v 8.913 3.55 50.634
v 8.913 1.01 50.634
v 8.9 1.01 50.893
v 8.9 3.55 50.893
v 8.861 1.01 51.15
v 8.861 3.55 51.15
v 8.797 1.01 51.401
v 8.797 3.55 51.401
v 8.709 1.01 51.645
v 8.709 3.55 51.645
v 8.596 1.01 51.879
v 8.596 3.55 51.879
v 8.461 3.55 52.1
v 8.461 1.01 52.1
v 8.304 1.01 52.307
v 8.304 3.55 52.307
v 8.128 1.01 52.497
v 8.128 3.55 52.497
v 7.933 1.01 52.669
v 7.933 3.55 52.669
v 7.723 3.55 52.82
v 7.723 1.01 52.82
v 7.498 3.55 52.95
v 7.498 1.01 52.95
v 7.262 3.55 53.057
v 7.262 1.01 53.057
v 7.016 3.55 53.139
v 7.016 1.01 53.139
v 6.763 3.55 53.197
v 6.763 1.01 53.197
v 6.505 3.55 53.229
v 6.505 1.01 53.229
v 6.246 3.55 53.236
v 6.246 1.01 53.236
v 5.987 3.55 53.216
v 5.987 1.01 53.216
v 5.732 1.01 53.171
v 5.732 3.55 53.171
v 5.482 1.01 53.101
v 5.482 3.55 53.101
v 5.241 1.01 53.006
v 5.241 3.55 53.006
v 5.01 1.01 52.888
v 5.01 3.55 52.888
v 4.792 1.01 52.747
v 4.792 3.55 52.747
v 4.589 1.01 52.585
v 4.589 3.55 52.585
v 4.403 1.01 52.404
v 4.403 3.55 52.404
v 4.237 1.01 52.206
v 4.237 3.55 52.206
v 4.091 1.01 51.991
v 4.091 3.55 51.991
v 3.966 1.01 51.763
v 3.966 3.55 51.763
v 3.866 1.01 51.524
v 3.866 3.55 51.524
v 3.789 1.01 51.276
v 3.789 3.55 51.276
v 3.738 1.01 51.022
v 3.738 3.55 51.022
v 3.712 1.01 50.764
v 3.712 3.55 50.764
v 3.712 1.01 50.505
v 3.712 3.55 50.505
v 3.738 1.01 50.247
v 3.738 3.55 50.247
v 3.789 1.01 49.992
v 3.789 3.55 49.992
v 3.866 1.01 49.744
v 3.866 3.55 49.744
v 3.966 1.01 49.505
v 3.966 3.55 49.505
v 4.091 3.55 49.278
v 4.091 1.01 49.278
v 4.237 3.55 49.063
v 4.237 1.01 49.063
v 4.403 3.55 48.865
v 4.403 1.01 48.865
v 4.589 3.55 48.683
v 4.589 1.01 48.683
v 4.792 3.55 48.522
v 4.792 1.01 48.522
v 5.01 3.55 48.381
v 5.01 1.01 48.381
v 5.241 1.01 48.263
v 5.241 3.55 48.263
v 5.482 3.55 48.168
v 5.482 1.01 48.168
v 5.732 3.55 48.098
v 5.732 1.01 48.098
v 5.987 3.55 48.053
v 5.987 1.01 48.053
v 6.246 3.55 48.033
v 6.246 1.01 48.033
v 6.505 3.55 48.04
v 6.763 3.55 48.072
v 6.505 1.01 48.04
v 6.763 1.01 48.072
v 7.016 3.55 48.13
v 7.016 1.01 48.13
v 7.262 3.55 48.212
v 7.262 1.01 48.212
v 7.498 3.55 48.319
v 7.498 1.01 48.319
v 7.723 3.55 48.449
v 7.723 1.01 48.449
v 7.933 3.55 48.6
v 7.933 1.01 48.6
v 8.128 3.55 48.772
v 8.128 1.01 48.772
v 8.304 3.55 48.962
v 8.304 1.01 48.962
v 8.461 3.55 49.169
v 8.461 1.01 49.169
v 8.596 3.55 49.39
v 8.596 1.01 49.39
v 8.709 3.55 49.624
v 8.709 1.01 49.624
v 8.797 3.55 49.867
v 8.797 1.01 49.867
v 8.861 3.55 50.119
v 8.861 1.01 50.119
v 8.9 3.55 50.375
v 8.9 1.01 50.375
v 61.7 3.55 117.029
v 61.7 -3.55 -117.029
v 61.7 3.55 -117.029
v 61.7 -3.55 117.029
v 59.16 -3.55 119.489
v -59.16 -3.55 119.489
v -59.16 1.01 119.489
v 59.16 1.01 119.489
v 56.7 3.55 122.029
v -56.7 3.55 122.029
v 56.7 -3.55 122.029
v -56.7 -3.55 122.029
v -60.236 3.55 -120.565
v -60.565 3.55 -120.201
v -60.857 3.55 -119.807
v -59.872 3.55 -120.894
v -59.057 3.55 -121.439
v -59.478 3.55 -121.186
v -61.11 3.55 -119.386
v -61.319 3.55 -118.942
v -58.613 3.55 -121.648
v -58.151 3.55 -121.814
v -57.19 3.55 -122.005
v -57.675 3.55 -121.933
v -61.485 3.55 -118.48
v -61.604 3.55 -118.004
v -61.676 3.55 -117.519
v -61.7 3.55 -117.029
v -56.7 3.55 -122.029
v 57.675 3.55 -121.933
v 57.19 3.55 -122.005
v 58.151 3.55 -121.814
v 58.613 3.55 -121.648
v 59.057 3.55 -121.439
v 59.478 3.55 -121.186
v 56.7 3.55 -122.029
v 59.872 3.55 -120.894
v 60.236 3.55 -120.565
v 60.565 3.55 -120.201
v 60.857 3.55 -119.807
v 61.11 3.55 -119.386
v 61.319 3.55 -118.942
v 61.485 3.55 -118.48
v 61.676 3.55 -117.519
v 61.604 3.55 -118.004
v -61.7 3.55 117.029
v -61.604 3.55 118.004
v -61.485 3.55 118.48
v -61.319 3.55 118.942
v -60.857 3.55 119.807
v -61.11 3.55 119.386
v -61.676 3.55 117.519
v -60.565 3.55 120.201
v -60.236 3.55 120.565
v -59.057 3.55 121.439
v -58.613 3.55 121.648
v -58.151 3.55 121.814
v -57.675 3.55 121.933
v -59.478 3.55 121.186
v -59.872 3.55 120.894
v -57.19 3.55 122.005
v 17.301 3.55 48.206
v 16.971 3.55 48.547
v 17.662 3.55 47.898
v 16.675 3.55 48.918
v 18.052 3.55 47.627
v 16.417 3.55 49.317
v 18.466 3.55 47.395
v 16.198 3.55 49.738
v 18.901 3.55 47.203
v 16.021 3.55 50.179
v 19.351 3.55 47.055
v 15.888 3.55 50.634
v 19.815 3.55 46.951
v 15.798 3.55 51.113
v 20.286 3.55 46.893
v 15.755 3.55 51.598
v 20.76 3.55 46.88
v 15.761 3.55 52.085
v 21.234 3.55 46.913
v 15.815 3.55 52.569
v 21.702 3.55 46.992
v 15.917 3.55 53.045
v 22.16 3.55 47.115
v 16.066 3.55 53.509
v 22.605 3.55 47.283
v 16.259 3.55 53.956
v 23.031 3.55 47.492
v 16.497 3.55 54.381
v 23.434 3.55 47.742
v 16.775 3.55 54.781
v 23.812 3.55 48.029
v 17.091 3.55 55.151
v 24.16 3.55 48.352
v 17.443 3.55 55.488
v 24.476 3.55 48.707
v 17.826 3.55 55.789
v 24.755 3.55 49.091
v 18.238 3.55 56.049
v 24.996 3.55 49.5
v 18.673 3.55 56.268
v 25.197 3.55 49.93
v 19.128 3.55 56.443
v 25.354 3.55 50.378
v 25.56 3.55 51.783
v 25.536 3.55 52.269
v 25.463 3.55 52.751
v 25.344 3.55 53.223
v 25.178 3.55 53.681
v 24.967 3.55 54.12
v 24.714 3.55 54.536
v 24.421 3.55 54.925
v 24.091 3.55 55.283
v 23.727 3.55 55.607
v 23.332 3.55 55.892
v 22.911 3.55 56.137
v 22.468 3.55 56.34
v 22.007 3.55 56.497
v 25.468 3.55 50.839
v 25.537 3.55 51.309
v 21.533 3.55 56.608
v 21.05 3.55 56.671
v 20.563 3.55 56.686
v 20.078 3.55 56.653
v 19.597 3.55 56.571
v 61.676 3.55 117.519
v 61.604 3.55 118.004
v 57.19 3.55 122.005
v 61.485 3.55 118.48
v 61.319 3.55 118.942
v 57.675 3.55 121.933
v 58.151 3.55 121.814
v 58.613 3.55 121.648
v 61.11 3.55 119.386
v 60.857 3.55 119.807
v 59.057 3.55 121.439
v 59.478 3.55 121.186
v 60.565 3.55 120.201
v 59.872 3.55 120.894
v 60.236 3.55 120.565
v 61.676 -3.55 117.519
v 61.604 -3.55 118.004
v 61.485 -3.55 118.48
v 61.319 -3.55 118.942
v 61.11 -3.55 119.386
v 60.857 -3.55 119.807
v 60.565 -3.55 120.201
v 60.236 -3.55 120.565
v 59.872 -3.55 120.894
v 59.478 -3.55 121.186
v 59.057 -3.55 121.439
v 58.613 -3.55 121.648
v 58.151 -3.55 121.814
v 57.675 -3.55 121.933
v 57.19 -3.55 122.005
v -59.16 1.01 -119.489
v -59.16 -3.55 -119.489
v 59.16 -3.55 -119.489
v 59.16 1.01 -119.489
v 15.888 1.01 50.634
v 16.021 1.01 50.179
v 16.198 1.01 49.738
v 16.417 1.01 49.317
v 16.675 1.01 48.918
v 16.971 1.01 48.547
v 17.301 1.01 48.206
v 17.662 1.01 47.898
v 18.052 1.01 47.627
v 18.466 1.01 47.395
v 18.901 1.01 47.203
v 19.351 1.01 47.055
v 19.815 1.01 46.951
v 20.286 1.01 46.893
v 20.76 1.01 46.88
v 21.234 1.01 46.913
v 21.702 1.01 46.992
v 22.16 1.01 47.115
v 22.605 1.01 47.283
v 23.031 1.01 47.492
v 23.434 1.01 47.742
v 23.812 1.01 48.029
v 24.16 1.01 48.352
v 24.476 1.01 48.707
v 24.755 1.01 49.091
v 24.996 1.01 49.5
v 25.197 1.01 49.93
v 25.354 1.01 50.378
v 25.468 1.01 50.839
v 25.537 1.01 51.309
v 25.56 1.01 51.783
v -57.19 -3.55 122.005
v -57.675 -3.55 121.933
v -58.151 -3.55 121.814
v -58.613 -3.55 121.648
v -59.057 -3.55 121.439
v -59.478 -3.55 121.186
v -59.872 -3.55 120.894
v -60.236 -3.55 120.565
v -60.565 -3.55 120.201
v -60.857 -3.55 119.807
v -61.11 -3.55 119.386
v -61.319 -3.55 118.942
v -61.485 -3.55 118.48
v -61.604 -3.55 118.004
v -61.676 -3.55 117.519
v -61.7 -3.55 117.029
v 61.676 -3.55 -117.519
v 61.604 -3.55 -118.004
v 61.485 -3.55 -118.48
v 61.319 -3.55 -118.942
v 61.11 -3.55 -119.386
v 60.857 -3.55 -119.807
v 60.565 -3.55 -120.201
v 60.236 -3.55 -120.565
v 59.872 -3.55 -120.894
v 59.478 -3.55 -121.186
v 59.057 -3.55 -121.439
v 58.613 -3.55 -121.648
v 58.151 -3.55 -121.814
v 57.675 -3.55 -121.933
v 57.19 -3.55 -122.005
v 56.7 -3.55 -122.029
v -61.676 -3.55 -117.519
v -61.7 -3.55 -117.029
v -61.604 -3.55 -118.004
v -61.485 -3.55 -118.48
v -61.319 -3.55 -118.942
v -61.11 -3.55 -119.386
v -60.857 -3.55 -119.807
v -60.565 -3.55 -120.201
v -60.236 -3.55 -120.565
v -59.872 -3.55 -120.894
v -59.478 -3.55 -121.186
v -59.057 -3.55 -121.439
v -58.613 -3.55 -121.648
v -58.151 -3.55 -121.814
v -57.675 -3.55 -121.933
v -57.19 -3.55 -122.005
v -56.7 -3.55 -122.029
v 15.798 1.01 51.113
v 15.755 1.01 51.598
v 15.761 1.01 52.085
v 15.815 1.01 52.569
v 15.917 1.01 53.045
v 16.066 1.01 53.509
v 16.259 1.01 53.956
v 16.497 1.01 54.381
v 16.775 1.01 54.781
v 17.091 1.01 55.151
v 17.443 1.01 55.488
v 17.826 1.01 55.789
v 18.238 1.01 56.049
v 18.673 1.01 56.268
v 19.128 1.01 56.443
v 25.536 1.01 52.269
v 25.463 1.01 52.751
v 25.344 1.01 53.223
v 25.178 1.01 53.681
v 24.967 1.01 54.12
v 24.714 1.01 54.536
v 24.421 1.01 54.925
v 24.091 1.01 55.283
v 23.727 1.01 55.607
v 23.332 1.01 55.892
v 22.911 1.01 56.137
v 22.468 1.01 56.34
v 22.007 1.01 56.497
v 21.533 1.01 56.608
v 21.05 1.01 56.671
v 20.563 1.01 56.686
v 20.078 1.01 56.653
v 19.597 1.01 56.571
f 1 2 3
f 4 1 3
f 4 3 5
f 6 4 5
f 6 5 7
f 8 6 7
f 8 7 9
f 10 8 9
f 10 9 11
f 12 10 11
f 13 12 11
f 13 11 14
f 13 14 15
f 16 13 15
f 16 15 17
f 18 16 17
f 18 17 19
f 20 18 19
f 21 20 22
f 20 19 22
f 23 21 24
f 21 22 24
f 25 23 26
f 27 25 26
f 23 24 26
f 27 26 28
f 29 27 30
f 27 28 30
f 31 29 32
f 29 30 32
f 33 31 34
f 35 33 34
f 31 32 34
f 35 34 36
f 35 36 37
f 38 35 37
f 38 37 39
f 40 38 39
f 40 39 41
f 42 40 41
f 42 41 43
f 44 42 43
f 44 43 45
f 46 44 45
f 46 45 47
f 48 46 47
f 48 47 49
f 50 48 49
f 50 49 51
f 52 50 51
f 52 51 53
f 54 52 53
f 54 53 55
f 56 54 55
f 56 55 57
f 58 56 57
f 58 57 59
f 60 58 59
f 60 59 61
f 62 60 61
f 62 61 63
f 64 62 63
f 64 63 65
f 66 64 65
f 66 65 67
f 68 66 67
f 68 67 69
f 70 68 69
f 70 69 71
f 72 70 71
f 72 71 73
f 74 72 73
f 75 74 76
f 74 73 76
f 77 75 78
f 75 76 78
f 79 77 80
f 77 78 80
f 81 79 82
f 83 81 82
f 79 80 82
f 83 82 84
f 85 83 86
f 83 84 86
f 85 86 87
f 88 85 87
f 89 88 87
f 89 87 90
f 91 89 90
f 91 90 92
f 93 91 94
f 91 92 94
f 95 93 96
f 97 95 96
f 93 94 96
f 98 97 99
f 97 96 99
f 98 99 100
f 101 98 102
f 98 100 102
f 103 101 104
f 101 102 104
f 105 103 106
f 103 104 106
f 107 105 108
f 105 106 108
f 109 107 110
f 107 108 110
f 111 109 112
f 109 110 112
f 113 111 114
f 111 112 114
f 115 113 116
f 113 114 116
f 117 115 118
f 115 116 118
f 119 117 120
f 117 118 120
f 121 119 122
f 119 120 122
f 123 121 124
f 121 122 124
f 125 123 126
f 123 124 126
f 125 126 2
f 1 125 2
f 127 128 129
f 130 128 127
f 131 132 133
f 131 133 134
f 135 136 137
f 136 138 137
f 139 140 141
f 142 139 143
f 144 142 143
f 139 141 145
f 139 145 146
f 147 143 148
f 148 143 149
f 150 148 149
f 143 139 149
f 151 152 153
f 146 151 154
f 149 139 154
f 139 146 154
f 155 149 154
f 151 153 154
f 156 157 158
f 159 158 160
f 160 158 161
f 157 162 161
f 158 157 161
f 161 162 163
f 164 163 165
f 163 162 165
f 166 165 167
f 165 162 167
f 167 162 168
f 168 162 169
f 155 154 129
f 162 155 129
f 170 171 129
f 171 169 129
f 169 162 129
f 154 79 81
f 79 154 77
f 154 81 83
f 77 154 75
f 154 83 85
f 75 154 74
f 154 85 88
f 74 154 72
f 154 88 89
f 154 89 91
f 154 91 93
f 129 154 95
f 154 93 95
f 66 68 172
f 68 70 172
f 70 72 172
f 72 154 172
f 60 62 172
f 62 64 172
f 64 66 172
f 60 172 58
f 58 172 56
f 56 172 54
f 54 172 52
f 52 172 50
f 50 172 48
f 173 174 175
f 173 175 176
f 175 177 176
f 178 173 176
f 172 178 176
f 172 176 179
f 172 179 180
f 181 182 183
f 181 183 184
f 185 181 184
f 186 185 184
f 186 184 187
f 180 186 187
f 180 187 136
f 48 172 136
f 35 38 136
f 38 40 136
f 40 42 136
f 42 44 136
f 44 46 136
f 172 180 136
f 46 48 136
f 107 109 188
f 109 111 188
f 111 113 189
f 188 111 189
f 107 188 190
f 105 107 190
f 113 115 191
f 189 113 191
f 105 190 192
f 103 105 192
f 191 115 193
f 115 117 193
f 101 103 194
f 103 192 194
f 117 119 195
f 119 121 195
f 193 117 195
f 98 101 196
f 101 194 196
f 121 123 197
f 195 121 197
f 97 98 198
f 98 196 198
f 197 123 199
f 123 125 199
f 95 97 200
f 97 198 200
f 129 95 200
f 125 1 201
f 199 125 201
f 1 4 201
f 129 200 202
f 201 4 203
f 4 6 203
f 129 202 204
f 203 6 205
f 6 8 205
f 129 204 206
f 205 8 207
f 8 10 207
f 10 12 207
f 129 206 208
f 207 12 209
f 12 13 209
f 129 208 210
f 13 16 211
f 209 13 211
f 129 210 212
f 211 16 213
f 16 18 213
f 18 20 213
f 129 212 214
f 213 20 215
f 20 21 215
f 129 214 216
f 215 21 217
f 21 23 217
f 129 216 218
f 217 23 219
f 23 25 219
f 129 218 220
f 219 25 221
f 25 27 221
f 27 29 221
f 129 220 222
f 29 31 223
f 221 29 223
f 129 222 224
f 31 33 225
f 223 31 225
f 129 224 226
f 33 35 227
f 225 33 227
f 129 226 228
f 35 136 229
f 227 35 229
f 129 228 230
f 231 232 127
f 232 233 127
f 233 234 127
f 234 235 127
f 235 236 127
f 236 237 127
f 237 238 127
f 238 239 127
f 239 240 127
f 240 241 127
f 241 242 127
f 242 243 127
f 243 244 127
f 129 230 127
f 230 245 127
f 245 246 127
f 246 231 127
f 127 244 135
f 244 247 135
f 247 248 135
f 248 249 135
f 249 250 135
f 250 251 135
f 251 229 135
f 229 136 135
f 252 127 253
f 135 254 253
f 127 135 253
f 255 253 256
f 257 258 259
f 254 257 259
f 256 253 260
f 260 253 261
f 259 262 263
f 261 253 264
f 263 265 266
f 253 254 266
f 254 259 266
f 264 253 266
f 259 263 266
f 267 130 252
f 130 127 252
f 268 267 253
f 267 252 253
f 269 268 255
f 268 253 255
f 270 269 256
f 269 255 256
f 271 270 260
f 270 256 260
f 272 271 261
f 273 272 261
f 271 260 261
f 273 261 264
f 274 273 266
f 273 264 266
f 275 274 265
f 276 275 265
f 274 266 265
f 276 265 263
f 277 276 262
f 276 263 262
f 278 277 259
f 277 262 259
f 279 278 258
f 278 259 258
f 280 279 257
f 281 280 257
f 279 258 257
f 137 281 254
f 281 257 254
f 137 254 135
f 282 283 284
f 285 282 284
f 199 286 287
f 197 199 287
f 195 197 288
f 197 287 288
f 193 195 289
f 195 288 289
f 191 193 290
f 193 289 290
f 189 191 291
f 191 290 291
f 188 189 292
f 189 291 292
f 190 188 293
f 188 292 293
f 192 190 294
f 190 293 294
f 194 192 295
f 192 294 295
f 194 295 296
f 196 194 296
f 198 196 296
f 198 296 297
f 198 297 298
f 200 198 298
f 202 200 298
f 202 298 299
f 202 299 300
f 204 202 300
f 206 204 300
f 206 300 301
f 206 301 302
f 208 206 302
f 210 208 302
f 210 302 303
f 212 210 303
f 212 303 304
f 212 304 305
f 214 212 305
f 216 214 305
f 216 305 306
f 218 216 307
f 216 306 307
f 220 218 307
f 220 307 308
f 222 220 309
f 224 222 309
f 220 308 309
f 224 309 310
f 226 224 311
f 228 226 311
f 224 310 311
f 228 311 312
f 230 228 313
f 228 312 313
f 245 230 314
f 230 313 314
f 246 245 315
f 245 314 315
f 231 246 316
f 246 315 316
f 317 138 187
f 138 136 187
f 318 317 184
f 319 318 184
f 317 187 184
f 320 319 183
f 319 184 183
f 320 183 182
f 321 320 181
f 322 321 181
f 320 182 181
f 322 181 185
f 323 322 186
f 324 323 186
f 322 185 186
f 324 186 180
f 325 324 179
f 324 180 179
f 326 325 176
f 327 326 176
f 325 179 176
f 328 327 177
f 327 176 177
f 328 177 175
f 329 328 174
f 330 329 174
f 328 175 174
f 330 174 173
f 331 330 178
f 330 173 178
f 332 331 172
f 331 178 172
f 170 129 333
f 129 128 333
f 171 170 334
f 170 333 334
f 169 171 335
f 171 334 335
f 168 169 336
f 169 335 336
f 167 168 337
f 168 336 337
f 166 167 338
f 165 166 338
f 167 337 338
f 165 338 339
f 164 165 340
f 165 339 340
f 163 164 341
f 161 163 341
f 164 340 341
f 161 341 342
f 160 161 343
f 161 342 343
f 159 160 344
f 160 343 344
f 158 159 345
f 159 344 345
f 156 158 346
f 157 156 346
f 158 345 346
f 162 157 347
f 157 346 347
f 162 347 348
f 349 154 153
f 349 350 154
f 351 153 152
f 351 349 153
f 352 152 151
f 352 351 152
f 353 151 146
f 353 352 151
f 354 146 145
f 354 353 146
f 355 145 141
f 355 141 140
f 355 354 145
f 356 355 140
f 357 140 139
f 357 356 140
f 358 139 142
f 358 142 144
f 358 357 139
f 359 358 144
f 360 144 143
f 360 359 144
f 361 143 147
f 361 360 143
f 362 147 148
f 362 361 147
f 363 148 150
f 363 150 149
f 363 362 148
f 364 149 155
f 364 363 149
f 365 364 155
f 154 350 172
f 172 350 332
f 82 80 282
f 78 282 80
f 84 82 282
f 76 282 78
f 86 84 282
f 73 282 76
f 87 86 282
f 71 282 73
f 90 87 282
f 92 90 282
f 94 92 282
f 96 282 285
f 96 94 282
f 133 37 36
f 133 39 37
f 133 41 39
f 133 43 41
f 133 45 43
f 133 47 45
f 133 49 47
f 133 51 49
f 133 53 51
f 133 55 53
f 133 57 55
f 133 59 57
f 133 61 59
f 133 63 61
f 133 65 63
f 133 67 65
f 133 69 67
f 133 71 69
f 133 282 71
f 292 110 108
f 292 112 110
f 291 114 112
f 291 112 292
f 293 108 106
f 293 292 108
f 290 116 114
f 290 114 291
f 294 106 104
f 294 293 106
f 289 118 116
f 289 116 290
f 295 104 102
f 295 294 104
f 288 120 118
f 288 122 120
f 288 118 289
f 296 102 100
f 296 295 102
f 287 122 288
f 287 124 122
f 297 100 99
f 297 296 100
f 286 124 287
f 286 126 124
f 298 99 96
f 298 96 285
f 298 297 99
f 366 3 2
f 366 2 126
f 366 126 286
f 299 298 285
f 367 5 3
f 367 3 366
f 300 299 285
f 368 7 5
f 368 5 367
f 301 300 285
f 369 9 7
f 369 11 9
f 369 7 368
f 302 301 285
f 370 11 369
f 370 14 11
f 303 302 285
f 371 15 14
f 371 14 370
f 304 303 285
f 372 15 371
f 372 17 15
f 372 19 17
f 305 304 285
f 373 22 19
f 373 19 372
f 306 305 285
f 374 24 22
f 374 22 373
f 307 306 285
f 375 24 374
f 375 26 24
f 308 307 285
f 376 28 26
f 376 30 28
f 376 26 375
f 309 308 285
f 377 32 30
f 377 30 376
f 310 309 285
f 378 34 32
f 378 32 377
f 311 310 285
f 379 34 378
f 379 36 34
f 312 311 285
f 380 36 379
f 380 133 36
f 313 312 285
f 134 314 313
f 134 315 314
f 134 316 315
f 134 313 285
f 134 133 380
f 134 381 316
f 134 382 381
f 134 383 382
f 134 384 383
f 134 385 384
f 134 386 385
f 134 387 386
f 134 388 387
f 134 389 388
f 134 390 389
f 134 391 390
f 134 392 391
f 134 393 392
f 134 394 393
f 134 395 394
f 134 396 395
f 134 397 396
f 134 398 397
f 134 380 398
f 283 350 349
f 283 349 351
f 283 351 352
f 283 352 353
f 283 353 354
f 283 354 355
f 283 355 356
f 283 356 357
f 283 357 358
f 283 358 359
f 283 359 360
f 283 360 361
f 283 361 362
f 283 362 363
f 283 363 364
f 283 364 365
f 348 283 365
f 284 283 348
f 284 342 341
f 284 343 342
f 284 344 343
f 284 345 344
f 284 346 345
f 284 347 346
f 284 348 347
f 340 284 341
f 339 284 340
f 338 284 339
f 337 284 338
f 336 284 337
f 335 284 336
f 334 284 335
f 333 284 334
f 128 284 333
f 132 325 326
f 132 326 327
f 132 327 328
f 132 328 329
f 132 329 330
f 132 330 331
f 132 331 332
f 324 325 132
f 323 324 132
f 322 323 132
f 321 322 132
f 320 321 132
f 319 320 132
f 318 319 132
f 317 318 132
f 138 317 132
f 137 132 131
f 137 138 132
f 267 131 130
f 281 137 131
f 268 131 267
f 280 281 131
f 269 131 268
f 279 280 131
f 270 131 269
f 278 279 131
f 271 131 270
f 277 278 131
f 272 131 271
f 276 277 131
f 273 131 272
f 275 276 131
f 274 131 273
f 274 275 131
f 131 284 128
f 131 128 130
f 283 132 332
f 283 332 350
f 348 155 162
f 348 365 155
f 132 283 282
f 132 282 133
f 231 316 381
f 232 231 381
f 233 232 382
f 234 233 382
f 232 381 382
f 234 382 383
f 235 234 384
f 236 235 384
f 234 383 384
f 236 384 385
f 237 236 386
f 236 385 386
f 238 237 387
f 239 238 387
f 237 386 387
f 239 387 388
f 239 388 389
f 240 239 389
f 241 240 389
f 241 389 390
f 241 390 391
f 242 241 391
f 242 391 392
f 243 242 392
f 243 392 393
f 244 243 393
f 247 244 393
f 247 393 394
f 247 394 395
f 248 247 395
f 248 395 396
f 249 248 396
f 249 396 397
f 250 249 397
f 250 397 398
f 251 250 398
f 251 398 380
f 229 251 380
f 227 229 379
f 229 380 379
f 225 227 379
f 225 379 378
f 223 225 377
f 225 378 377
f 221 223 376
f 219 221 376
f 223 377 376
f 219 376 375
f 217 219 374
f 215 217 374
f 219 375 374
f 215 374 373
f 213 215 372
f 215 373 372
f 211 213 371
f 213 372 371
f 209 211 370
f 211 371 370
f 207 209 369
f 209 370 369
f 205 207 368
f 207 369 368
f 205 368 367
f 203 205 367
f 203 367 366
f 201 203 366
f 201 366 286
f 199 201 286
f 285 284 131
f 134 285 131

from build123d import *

# Parameters (mm, degrees)
F0_W     = 123.4
F0_H     = 244.057946
F1_DEPTH = 3.55
F2_T     = -2.54
F4_R     = 5
F3_R     = 2.602058
F5_DEPTH = 25


with BuildPart() as f1:
    # F0 (on Front) → F1 (new body, symmetric)
    with BuildSketch(Plane.XZ):
        Rectangle(F0_W, F0_H)
    extrude(amount=F1_DEPTH, both=True)

    # F2
    f2_openings = [f1.faces().sort_by_distance(p)[0] for p in [
        (0, -3.55, 0),
    ]]
    offset(amount=F2_T, openings=f2_openings)

    # F4
    f4_edges = [f1.edges().sort_by_distance(p)[0] for p in [
        (61.7, 0, 122.028973),
        (-61.7, 0, 122.028973),
        (-61.7, 0, -122.028973),
        (61.7, 0, -122.028973),
    ]]
    fillet(f4_edges, radius=F4_R)

    # F3 (on Front) → F5 (cut)
    with BuildSketch(Plane.XZ):
        with BuildLine():
            ThreePointArc((25.559906, 51.782791), (20.077513, 56.652751), (15.887922, 50.634407))
            ThreePointArc((15.887922, 50.634407), (21.233963, 46.91283), (25.559906, 51.782791))
        make_face()
        with Locations((6.310866, 50.634407)):
            Circle(F3_R)
    extrude(amount=-F5_DEPTH, mode=Mode.SUBTRACT)


solid = f1.part
